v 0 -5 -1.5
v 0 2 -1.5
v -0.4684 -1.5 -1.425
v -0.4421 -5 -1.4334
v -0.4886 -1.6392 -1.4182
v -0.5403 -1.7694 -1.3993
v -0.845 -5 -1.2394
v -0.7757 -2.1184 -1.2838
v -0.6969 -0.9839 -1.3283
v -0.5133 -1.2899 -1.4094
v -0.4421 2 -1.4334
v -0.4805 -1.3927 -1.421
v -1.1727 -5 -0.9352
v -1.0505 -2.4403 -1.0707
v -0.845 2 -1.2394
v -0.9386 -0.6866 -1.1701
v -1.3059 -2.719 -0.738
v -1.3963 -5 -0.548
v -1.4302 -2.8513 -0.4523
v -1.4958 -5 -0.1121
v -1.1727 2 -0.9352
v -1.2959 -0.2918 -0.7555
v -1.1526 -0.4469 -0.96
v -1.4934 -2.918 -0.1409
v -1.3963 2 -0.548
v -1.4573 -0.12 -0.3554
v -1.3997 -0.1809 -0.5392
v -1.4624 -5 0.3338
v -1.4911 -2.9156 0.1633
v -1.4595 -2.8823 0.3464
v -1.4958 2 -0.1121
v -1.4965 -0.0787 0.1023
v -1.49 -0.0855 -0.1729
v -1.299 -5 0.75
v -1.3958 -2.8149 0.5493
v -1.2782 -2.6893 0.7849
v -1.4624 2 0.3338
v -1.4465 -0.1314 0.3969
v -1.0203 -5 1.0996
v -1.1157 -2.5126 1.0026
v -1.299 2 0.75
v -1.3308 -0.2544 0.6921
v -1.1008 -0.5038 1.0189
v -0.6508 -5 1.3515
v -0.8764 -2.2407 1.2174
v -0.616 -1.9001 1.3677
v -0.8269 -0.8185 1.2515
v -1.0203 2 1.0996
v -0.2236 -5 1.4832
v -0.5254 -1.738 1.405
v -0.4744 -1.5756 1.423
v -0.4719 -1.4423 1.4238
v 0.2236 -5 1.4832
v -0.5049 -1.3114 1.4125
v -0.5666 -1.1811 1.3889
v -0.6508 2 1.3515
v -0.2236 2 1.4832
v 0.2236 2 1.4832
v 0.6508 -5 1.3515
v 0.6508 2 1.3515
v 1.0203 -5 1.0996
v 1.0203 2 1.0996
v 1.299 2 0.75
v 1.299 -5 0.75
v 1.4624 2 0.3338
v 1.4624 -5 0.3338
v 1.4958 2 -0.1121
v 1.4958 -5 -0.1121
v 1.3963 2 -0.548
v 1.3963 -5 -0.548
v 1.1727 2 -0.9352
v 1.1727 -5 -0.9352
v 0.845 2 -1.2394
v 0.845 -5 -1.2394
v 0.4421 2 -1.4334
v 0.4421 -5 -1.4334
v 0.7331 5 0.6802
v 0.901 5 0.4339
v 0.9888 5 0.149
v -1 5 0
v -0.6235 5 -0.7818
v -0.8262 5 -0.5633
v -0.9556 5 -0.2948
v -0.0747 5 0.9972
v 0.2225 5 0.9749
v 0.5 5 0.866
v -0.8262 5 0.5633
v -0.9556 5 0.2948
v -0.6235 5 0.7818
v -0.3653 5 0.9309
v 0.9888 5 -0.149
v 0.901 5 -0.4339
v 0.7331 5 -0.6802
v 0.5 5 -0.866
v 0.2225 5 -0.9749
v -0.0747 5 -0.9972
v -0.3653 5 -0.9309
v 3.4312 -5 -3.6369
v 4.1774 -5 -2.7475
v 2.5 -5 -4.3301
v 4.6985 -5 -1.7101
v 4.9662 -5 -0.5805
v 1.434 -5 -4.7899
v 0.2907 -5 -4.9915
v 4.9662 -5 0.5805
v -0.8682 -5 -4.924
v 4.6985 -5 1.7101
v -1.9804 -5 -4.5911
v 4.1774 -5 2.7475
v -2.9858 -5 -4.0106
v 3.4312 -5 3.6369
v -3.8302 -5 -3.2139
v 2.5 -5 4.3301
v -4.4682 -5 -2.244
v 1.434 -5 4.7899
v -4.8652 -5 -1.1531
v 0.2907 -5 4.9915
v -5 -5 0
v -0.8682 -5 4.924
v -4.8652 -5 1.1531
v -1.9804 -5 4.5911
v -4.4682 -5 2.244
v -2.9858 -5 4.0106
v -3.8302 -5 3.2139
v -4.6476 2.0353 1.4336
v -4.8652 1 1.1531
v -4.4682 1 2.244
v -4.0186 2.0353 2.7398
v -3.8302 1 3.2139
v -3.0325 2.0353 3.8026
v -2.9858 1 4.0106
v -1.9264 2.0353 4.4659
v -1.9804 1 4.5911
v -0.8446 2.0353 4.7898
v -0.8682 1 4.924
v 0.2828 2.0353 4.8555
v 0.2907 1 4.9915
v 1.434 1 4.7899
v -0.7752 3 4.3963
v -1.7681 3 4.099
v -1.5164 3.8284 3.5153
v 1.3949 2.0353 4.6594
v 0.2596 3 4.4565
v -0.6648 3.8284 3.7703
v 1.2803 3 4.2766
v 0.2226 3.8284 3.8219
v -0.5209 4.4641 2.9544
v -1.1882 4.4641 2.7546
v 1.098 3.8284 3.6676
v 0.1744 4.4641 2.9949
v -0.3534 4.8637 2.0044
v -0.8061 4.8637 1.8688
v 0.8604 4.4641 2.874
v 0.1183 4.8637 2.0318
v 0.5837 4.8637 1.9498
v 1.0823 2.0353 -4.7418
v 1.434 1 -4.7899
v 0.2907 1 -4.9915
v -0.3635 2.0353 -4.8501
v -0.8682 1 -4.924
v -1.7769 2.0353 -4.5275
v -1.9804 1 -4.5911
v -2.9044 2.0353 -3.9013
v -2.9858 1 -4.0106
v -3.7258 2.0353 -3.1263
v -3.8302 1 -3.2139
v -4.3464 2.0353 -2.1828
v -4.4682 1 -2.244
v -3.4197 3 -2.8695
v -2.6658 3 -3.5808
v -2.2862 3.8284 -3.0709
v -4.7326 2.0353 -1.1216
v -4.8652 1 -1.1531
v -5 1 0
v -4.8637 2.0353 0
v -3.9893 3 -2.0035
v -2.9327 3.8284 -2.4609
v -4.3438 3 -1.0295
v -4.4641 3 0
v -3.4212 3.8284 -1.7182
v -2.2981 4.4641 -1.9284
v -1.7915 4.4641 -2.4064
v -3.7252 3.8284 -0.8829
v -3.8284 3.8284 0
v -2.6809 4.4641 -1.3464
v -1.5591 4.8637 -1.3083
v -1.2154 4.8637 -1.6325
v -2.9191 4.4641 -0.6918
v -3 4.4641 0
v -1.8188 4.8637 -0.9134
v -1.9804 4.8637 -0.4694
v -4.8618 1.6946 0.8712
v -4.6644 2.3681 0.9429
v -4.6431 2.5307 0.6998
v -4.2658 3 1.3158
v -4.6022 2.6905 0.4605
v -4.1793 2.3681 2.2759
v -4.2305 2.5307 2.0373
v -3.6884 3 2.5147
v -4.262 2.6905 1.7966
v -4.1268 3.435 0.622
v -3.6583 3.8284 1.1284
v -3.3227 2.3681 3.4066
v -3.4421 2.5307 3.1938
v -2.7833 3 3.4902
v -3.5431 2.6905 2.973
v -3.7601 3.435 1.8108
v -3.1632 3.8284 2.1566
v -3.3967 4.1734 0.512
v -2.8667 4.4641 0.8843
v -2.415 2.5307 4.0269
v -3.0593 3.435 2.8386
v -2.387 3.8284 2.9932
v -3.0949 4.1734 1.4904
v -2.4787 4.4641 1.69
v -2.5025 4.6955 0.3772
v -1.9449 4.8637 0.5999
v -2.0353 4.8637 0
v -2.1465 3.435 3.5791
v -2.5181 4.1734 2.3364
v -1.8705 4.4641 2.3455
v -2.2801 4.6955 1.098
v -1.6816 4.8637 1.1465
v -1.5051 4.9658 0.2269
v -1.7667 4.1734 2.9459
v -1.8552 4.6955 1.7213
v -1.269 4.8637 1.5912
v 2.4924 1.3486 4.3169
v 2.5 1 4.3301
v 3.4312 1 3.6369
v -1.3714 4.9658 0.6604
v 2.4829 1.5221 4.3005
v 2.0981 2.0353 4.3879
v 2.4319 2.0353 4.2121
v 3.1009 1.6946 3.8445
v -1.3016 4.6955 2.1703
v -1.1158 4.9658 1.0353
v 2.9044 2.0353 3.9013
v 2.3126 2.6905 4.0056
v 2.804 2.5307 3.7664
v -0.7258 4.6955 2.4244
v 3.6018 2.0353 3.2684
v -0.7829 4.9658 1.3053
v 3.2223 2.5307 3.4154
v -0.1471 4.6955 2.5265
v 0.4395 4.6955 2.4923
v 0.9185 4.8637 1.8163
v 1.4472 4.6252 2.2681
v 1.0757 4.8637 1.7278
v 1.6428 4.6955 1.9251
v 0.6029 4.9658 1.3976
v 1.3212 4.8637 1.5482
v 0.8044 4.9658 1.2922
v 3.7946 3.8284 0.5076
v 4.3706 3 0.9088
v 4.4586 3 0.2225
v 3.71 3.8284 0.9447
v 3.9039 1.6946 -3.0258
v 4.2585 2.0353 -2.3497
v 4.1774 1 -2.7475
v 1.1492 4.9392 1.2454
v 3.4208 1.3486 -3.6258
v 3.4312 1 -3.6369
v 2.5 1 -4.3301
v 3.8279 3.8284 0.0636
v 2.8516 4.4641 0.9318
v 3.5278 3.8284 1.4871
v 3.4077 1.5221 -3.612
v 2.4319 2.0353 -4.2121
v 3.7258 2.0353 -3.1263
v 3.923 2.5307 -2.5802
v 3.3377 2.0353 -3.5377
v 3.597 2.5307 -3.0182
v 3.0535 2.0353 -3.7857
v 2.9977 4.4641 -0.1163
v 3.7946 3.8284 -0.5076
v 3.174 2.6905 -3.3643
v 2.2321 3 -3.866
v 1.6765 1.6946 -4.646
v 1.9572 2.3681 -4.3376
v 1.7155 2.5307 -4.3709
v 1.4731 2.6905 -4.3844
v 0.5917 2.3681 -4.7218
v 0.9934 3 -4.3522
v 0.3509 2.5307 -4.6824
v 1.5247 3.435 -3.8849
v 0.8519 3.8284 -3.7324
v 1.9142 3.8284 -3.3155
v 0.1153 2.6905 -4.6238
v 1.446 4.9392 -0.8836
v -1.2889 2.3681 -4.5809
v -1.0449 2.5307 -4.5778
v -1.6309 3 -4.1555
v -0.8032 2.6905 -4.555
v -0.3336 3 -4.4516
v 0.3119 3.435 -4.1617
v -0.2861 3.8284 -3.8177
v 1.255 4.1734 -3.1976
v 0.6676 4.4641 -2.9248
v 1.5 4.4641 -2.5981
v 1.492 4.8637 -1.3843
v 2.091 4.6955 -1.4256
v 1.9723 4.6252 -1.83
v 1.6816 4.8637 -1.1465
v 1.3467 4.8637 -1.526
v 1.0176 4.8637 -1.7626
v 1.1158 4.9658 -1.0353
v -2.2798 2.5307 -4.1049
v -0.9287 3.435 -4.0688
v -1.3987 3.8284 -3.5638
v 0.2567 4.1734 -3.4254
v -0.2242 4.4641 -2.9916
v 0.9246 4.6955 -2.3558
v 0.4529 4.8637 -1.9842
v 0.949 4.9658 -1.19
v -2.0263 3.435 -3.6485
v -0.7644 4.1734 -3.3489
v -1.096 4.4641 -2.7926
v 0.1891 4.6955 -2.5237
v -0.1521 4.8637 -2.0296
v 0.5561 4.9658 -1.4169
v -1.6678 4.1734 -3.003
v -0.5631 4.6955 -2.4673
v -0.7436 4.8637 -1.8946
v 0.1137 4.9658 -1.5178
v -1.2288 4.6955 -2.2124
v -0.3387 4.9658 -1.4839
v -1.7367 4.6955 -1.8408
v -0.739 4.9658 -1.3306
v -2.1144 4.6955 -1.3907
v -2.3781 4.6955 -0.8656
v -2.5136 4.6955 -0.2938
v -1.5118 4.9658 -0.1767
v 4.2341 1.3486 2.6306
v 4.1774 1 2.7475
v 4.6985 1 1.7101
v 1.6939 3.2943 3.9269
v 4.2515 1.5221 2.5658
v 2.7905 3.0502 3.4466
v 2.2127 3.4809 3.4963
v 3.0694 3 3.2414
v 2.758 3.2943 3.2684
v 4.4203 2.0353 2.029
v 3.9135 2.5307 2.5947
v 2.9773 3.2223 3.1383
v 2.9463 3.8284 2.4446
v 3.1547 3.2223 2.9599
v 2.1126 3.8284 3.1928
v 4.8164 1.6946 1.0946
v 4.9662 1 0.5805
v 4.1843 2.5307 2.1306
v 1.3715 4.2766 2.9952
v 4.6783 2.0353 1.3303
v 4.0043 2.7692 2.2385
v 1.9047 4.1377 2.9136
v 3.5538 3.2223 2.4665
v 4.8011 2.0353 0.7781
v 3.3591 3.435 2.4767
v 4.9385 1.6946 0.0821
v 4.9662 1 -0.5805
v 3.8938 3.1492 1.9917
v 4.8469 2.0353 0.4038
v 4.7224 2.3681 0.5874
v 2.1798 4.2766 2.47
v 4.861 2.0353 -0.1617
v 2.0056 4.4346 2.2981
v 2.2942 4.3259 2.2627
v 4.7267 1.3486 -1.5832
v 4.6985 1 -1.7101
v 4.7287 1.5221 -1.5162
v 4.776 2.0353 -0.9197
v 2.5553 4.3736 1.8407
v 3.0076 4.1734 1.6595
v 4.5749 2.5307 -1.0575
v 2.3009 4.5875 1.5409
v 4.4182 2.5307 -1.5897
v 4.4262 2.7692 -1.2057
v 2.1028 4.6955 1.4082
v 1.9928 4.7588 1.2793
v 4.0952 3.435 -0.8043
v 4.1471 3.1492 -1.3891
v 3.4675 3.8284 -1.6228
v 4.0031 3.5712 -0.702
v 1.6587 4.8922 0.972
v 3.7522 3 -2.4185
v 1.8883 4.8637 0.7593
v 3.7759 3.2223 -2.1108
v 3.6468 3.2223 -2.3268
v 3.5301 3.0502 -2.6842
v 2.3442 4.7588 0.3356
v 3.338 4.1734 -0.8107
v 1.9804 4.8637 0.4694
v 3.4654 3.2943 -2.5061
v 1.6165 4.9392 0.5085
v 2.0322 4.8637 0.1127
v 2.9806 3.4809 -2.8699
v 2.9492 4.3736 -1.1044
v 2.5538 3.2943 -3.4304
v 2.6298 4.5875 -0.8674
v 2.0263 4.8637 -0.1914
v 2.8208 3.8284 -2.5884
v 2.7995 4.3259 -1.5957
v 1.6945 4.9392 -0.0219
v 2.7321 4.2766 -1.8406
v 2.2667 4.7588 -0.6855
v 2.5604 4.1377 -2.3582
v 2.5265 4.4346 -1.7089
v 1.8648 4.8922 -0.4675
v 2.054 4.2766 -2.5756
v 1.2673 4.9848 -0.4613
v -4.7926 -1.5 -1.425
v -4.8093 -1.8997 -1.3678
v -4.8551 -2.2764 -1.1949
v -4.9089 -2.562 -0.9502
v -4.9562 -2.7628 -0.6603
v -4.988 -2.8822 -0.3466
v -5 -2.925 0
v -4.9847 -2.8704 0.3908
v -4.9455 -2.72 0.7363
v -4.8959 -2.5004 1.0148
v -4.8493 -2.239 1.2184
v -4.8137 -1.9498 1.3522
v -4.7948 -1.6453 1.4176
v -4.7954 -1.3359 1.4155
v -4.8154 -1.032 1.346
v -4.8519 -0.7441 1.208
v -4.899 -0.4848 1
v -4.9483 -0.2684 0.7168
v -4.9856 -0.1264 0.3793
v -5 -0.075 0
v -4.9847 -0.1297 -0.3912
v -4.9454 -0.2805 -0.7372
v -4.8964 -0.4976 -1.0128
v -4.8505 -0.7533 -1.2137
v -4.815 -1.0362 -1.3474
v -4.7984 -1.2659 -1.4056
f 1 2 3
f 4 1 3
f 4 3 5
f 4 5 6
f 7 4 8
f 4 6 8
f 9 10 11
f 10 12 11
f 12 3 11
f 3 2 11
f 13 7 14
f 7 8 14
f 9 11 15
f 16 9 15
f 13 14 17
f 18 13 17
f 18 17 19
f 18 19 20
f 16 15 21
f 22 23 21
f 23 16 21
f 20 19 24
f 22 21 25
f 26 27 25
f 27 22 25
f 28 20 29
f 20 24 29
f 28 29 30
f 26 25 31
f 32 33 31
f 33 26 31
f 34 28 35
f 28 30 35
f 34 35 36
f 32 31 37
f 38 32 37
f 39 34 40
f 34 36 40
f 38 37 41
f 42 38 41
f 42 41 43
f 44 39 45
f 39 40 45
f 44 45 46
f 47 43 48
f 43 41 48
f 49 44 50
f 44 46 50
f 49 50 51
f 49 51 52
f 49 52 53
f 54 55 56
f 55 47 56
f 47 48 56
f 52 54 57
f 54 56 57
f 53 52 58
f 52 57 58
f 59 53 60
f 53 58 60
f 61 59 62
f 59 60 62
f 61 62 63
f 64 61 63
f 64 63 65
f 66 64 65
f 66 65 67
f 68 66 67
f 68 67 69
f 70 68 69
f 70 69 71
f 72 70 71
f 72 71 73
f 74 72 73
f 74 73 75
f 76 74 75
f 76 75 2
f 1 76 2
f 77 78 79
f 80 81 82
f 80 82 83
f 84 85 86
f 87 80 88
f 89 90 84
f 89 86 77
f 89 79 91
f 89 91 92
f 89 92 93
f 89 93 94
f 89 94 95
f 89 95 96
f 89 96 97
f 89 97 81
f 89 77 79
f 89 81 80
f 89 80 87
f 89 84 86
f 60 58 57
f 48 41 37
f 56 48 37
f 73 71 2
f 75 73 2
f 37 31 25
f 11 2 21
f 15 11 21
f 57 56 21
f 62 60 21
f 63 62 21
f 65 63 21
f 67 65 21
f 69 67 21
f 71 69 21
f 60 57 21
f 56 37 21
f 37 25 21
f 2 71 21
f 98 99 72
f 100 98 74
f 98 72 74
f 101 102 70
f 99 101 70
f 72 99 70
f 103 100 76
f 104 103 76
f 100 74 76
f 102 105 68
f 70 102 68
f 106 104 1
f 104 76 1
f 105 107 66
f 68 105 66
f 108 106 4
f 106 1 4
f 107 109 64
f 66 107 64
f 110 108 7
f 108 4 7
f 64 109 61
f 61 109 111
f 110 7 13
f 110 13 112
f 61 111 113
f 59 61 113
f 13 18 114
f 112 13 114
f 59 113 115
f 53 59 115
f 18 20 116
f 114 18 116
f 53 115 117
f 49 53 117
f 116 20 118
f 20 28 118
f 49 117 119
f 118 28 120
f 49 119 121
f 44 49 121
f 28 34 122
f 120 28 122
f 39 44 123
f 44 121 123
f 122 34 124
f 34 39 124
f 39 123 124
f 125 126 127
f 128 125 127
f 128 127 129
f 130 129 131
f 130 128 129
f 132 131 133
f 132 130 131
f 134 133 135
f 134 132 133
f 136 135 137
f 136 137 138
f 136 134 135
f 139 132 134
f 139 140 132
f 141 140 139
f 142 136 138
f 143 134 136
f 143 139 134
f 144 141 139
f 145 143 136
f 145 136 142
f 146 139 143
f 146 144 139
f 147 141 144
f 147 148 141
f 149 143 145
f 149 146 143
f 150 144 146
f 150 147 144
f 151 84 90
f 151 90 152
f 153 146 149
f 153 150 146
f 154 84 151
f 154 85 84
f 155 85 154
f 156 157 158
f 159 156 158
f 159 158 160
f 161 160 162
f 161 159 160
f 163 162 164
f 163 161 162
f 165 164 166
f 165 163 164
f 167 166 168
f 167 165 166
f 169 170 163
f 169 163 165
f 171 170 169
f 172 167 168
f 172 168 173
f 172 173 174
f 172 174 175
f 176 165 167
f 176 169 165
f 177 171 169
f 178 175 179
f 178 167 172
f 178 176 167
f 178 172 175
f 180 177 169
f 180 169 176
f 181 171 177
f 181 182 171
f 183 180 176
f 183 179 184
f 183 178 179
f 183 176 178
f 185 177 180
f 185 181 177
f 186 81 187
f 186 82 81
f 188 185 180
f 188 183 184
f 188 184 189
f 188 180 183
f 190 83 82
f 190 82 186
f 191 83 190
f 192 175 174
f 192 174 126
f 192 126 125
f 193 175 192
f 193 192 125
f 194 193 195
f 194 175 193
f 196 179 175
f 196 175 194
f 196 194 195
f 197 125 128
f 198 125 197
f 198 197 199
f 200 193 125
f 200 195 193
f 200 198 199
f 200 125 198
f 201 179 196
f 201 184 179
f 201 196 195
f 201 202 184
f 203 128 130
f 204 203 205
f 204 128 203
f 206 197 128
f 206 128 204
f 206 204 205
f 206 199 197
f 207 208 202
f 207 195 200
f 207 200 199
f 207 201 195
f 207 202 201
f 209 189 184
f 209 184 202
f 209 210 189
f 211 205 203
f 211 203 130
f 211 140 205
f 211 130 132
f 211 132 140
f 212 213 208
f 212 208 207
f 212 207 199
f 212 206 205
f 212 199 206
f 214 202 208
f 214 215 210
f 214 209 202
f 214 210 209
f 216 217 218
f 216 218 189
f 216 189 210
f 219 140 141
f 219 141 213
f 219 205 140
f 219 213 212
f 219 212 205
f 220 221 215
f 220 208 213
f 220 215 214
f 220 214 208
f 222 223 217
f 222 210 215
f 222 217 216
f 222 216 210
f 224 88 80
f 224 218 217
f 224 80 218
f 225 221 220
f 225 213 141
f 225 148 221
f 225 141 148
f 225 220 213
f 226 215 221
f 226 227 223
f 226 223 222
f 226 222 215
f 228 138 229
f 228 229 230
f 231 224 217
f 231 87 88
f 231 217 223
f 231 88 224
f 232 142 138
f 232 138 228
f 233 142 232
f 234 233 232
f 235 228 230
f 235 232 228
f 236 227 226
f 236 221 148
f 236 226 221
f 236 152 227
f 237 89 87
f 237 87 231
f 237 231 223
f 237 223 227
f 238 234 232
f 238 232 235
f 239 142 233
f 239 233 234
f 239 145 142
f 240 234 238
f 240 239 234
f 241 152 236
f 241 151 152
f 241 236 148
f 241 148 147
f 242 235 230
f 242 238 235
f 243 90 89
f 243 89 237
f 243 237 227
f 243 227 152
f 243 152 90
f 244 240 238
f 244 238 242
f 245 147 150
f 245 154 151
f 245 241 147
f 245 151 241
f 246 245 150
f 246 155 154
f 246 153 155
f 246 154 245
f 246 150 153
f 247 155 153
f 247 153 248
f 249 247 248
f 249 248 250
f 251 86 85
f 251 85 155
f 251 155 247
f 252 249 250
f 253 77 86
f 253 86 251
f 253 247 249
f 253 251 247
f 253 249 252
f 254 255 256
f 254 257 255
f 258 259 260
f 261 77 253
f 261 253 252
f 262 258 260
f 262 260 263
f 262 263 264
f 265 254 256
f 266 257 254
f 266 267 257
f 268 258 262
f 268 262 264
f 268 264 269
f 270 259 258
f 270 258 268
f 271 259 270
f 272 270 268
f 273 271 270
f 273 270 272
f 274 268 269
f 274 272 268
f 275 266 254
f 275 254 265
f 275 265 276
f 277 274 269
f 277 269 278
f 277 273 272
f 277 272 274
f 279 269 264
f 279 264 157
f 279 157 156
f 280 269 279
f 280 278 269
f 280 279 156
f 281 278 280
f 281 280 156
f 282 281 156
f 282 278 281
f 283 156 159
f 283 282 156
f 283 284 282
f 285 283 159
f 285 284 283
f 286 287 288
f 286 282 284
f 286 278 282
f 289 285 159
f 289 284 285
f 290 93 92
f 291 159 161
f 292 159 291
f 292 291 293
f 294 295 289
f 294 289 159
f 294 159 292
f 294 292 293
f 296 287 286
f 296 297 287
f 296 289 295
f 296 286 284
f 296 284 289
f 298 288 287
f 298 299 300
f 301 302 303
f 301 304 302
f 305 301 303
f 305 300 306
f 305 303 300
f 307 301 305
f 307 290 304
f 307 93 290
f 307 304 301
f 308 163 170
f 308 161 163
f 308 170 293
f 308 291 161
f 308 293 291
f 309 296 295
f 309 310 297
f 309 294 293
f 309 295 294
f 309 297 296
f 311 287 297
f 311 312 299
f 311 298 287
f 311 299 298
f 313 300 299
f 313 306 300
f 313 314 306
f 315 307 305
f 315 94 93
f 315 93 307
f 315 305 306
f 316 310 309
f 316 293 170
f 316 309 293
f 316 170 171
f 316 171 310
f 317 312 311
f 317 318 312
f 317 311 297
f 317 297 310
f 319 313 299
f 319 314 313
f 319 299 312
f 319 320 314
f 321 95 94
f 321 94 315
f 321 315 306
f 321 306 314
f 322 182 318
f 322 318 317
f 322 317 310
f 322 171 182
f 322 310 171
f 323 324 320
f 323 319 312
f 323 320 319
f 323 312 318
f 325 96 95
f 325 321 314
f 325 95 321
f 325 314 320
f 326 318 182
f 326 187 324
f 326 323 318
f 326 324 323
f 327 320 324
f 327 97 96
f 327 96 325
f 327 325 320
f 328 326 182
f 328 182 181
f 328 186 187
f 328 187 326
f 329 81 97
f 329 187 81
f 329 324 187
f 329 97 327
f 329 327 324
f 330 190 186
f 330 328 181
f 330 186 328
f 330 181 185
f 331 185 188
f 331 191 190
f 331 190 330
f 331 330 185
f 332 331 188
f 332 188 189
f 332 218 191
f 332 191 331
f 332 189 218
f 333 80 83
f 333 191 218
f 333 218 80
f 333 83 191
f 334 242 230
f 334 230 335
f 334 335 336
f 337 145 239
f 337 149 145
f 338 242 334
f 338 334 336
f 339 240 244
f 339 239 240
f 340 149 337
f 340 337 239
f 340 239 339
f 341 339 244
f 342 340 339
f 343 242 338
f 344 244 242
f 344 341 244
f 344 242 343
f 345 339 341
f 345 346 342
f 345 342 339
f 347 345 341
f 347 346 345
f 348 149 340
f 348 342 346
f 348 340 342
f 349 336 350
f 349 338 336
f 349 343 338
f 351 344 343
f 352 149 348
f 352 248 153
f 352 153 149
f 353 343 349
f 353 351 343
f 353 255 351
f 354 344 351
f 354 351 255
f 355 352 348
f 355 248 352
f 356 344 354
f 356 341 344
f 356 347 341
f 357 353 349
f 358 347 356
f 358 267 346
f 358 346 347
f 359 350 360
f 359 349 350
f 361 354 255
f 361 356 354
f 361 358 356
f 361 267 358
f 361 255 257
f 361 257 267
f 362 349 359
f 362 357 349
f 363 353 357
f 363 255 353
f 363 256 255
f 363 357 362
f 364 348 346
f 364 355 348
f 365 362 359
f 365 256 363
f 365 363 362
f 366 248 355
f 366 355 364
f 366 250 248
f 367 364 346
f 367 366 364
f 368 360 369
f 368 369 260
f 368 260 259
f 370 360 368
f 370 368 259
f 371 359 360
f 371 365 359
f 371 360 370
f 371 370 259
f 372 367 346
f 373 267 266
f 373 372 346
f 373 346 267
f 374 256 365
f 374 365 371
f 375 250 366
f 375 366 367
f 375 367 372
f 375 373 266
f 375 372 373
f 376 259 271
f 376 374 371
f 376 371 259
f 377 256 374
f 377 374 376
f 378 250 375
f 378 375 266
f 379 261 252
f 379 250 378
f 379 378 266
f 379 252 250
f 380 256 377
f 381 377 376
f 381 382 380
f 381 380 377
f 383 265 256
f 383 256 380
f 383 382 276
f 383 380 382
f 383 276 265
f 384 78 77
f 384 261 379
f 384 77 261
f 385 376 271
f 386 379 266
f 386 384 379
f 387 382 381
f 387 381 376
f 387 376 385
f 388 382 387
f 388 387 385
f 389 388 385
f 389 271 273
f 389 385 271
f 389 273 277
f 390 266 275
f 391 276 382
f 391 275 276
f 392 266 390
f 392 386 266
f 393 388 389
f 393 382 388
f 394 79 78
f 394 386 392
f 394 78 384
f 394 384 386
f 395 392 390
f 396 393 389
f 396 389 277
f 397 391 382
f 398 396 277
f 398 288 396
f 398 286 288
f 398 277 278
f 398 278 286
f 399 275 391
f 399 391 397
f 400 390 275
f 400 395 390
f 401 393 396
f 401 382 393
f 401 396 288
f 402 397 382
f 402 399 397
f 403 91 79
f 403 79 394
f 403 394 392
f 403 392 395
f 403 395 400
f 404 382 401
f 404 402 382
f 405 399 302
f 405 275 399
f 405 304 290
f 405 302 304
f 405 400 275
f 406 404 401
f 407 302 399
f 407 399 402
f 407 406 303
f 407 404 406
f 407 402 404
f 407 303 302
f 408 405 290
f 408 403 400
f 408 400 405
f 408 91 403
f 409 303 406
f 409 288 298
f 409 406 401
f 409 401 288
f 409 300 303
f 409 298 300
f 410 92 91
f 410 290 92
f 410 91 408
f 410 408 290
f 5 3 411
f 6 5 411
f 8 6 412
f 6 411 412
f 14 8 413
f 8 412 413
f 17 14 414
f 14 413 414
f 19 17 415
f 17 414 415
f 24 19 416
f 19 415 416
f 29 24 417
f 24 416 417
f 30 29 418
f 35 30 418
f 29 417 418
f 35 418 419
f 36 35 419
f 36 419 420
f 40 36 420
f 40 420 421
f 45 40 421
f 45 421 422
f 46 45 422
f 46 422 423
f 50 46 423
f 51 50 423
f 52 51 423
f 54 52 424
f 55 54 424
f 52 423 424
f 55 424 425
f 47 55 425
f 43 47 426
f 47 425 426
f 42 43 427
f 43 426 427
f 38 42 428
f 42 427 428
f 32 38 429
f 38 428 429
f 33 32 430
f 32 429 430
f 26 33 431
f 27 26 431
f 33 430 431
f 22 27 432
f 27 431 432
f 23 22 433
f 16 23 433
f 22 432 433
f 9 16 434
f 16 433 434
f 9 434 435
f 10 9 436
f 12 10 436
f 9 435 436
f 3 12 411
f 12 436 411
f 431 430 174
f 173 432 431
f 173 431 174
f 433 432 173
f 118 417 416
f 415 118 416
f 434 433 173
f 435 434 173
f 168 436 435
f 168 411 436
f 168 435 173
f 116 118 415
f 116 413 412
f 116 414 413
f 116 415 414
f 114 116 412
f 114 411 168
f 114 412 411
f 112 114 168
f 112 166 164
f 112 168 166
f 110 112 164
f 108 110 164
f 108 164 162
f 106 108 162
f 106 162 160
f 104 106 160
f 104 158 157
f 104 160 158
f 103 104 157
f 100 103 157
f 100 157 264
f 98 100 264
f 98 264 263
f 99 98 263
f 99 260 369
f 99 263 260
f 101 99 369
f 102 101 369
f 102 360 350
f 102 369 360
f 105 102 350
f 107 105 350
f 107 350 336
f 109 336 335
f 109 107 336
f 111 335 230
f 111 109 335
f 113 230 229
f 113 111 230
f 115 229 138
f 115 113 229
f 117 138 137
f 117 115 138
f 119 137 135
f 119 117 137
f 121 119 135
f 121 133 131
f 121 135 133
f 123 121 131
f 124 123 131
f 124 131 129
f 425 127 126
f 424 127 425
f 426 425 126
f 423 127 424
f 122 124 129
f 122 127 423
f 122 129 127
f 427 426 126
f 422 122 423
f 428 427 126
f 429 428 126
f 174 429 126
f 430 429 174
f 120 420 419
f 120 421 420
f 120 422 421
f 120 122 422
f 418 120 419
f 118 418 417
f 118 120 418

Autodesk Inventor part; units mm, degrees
ref_plane "YZ Plane" through (0, 0, 0) normal (1, 0, 0) x (0, 1, 0)
ref_plane "XZ Plane" through (0, 0, 0) normal (0, 1, 0) x (-1, 0, 0)
ref_plane "XY Plane" through (0, 0, 0) normal (0, 0, 1) x (1, 0, 0)
sketch "Sketch4" plane through (0, 0, 0) normal (0, 1, 0) x (-1, 0, 0)
  circle A0 centre (0, 0) radius 5
extrude "Extrusion2" add sketch "Sketch4" along normal mid plane 10
fillet "Fillet5" radius 4 1 edges at (5, 5, 0)
sketch "Sketch14" plane through (0, -5, 0) normal (0, -1, 0) x (1, 0, 0)
  circle A0 centre (0, 0) radius 1 projected
hole "Hole6" at (0, -5, 0) direction (0, 1, 0) diameter 3 depth 7
sketch "Sketch15" plane through (0, 0, 0) normal (1, 0, 0) x (0, 1, 0)
  line L0 (-5, 5) -> (-5, -5) projected
  point P0 (0, 0)
  point P1 (-1.5, 0)
  dimension "d109" = 3.5
hole "Hole7" at (0, -1.5, 0) direction (-1, 0, 0) diameter 2.85 depth 10.4 thread size "M3.5x0.6" class "6H" standard "ISO Metric profile"
properties part number "Top Lock Cap" material "Mild Steel S355 J2"
